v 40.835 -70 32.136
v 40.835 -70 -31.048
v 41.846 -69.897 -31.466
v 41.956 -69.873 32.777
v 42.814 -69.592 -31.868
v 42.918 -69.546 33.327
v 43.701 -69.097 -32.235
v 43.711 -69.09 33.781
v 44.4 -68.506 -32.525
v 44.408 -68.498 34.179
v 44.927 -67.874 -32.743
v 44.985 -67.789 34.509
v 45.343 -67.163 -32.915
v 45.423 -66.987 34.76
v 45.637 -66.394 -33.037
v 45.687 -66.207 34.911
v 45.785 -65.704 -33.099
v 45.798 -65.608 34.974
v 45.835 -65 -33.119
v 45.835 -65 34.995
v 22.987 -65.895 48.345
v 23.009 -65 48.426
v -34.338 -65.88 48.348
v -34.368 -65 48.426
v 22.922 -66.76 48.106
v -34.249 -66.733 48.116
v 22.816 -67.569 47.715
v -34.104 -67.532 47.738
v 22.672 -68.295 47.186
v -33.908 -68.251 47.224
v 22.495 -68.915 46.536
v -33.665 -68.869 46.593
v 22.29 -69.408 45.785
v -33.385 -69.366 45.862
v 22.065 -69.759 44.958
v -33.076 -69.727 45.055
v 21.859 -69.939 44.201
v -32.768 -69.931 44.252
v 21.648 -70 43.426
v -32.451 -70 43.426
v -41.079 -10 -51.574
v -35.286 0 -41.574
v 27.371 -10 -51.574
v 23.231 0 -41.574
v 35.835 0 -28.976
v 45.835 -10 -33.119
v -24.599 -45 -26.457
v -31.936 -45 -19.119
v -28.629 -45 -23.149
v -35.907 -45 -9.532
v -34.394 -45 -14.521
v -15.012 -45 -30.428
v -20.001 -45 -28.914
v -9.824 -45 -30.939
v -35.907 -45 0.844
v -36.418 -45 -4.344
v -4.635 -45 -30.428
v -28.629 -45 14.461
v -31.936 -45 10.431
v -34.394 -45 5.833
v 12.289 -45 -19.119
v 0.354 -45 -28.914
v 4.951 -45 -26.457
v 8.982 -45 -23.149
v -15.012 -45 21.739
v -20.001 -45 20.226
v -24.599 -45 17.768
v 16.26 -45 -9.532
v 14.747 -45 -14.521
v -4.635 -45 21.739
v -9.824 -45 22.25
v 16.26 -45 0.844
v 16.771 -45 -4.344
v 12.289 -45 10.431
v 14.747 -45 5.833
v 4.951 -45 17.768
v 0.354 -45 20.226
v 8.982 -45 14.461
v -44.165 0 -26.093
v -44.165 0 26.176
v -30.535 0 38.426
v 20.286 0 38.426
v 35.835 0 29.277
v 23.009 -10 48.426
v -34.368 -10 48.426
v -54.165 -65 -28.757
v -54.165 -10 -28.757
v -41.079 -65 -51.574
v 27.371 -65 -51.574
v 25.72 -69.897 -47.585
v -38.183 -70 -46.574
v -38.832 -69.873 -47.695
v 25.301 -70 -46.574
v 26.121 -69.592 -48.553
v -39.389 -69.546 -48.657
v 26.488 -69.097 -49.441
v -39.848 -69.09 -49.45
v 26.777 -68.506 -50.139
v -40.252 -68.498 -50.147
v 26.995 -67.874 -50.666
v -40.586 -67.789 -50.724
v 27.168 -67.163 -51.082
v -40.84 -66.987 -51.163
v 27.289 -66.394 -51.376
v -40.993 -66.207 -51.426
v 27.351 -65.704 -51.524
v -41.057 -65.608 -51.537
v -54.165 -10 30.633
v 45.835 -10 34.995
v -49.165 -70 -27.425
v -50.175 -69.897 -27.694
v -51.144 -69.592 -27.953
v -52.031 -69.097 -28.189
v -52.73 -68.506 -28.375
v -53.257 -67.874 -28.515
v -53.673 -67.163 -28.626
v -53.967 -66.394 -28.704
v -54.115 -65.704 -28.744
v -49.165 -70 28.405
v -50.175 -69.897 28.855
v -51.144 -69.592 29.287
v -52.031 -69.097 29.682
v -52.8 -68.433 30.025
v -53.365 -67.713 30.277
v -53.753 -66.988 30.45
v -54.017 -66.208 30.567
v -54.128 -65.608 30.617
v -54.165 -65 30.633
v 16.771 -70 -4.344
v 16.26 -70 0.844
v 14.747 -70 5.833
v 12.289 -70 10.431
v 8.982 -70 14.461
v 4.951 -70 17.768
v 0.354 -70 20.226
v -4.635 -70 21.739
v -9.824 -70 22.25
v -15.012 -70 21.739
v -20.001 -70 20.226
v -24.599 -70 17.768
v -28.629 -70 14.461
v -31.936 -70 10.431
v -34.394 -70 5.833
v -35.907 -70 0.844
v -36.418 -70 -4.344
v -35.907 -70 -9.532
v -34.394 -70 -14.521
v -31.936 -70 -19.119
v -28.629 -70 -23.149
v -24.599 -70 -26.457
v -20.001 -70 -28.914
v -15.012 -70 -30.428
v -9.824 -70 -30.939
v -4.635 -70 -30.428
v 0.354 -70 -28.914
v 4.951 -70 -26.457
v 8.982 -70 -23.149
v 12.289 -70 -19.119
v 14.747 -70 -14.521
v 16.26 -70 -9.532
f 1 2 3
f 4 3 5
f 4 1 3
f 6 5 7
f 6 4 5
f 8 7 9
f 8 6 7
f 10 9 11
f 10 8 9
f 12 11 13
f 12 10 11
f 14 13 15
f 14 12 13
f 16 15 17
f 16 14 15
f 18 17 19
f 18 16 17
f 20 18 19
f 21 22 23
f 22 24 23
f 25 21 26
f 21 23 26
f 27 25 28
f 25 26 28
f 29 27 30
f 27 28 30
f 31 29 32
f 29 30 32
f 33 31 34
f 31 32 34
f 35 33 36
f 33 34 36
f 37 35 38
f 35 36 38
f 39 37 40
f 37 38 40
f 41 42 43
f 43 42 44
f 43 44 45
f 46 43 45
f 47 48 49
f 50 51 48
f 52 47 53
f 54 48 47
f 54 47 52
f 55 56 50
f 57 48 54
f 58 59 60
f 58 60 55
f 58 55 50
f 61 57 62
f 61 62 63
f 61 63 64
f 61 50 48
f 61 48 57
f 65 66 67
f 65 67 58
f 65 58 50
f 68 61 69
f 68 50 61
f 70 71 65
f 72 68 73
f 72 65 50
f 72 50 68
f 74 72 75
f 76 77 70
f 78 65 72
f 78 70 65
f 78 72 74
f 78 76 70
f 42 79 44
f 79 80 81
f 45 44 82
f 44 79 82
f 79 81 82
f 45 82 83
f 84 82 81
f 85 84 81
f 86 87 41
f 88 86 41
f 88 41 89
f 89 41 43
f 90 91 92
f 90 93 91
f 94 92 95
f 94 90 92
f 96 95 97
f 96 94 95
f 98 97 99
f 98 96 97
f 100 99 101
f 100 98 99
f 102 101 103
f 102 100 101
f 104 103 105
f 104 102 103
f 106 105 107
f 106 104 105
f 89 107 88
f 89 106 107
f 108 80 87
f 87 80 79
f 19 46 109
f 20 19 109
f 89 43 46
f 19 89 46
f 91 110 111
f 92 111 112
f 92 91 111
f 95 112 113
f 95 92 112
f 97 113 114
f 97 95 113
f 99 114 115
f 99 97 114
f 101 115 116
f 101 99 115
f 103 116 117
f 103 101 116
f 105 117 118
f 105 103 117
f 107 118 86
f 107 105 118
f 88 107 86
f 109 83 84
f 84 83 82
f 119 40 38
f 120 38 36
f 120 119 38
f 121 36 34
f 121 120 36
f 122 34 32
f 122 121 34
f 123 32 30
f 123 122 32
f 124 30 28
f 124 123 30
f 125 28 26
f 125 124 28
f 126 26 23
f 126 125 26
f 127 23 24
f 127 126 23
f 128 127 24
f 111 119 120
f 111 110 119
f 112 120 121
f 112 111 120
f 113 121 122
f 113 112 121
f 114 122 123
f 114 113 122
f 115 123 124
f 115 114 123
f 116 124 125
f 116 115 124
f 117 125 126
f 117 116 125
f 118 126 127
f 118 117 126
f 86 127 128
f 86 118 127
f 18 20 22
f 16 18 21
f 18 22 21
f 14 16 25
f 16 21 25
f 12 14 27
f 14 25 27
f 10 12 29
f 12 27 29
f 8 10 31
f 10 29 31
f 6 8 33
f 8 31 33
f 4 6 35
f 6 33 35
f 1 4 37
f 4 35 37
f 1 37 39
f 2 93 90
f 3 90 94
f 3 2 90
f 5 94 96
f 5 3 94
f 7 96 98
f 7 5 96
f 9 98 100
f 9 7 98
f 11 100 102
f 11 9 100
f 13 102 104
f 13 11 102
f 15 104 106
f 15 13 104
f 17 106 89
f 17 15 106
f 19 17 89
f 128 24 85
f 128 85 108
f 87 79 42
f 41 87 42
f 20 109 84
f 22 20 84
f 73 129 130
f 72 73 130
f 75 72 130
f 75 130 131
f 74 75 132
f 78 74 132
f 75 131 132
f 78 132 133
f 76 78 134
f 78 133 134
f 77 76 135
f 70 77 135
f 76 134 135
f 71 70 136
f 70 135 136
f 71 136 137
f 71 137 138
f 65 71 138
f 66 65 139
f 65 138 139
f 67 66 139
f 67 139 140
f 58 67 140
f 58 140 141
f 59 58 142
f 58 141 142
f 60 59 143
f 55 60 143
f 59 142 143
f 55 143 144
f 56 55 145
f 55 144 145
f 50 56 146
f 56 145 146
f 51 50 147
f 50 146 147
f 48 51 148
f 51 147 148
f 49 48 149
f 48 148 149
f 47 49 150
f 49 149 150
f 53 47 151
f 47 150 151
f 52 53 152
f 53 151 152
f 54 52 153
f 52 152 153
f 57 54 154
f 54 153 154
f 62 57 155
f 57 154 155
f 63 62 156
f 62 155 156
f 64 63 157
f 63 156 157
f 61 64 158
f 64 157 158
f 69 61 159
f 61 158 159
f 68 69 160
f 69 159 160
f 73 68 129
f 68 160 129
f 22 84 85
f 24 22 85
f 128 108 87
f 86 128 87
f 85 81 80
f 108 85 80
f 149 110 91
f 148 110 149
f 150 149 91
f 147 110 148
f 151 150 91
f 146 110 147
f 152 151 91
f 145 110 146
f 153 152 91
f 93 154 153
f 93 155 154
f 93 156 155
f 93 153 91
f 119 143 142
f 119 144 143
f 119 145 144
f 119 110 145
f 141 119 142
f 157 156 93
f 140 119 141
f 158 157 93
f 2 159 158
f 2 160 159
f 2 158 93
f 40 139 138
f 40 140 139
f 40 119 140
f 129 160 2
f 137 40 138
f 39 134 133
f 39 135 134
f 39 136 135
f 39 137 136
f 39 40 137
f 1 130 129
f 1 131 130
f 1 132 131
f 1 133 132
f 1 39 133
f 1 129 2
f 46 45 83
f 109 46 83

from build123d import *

# Parameters (mm, degrees)
F1_DEPTH = 70
F2_SIZE  = 10
F3_R     = 5
F4_R     = 21.491967
F5_DEPTH = 39.1
F6_R     = 26.594603
F7_DEPTH = 25


with BuildPart() as f1:
    # F0 (on Front) → F1 (new body)
    with BuildSketch(Plane.XZ):
        Polygon((23.009436, 48.425878), (-34.368057, 48.425878), (-54.164968, 30.633396), (-54.164968, -28.757341), (-41.078873, -51.574122), (27.371468, -51.574122), (45.835032, -33.119373), (45.835032, 34.995425), align=None)
    extrude(amount=F1_DEPTH)

    # F2
    f2_edges = [f1.edges().sort_by_distance(p)[0] for p in [
        (-5.67931, 0, 48.425878),
        (-44.266513, 0, 39.529637),
        (-54.164968, 0, 0.938027),
        (-47.621921, 0, -40.165732),
        (-6.853702, 0, -51.574122),
        (36.60325, 0, -42.346748),
        (45.835032, 0, 0.938026),
        (34.422234, 0, 41.710652),
    ]]
    chamfer(f2_edges, length=F2_SIZE)

    # F3
    f3_edges = [f1.edges().sort_by_distance(p)[0] for p in [
        (-5.67931, -70, 48.425878),
        (-44.266513, -70, 39.529637),
        (-54.164968, -70, 0.938027),
        (-47.621921, -70, -40.165732),
        (-6.853702, -70, -51.574122),
        (36.60325, -70, -42.346748),
        (45.835032, -70, 0.938026),
        (34.422234, -70, 41.710652),
    ]]
    fillet(f3_edges, radius=F3_R)

    # F4 (on face) → F5 (join)
    with BuildSketch(Plane(origin=(0, 0, 0), x_dir=(-1, 0, 0), z_dir=(0, 1, 0))):
        Circle(F4_R)
    extrude(amount=-F5_DEPTH)

    # F6 (on face) → F7 (cut)
    with BuildSketch(Plane.XZ.offset(70)):
        with Locations((-9.82369, -4.344146)):
            Circle(F6_R)
    extrude(amount=-F7_DEPTH, mode=Mode.SUBTRACT)


solid = f1.part
